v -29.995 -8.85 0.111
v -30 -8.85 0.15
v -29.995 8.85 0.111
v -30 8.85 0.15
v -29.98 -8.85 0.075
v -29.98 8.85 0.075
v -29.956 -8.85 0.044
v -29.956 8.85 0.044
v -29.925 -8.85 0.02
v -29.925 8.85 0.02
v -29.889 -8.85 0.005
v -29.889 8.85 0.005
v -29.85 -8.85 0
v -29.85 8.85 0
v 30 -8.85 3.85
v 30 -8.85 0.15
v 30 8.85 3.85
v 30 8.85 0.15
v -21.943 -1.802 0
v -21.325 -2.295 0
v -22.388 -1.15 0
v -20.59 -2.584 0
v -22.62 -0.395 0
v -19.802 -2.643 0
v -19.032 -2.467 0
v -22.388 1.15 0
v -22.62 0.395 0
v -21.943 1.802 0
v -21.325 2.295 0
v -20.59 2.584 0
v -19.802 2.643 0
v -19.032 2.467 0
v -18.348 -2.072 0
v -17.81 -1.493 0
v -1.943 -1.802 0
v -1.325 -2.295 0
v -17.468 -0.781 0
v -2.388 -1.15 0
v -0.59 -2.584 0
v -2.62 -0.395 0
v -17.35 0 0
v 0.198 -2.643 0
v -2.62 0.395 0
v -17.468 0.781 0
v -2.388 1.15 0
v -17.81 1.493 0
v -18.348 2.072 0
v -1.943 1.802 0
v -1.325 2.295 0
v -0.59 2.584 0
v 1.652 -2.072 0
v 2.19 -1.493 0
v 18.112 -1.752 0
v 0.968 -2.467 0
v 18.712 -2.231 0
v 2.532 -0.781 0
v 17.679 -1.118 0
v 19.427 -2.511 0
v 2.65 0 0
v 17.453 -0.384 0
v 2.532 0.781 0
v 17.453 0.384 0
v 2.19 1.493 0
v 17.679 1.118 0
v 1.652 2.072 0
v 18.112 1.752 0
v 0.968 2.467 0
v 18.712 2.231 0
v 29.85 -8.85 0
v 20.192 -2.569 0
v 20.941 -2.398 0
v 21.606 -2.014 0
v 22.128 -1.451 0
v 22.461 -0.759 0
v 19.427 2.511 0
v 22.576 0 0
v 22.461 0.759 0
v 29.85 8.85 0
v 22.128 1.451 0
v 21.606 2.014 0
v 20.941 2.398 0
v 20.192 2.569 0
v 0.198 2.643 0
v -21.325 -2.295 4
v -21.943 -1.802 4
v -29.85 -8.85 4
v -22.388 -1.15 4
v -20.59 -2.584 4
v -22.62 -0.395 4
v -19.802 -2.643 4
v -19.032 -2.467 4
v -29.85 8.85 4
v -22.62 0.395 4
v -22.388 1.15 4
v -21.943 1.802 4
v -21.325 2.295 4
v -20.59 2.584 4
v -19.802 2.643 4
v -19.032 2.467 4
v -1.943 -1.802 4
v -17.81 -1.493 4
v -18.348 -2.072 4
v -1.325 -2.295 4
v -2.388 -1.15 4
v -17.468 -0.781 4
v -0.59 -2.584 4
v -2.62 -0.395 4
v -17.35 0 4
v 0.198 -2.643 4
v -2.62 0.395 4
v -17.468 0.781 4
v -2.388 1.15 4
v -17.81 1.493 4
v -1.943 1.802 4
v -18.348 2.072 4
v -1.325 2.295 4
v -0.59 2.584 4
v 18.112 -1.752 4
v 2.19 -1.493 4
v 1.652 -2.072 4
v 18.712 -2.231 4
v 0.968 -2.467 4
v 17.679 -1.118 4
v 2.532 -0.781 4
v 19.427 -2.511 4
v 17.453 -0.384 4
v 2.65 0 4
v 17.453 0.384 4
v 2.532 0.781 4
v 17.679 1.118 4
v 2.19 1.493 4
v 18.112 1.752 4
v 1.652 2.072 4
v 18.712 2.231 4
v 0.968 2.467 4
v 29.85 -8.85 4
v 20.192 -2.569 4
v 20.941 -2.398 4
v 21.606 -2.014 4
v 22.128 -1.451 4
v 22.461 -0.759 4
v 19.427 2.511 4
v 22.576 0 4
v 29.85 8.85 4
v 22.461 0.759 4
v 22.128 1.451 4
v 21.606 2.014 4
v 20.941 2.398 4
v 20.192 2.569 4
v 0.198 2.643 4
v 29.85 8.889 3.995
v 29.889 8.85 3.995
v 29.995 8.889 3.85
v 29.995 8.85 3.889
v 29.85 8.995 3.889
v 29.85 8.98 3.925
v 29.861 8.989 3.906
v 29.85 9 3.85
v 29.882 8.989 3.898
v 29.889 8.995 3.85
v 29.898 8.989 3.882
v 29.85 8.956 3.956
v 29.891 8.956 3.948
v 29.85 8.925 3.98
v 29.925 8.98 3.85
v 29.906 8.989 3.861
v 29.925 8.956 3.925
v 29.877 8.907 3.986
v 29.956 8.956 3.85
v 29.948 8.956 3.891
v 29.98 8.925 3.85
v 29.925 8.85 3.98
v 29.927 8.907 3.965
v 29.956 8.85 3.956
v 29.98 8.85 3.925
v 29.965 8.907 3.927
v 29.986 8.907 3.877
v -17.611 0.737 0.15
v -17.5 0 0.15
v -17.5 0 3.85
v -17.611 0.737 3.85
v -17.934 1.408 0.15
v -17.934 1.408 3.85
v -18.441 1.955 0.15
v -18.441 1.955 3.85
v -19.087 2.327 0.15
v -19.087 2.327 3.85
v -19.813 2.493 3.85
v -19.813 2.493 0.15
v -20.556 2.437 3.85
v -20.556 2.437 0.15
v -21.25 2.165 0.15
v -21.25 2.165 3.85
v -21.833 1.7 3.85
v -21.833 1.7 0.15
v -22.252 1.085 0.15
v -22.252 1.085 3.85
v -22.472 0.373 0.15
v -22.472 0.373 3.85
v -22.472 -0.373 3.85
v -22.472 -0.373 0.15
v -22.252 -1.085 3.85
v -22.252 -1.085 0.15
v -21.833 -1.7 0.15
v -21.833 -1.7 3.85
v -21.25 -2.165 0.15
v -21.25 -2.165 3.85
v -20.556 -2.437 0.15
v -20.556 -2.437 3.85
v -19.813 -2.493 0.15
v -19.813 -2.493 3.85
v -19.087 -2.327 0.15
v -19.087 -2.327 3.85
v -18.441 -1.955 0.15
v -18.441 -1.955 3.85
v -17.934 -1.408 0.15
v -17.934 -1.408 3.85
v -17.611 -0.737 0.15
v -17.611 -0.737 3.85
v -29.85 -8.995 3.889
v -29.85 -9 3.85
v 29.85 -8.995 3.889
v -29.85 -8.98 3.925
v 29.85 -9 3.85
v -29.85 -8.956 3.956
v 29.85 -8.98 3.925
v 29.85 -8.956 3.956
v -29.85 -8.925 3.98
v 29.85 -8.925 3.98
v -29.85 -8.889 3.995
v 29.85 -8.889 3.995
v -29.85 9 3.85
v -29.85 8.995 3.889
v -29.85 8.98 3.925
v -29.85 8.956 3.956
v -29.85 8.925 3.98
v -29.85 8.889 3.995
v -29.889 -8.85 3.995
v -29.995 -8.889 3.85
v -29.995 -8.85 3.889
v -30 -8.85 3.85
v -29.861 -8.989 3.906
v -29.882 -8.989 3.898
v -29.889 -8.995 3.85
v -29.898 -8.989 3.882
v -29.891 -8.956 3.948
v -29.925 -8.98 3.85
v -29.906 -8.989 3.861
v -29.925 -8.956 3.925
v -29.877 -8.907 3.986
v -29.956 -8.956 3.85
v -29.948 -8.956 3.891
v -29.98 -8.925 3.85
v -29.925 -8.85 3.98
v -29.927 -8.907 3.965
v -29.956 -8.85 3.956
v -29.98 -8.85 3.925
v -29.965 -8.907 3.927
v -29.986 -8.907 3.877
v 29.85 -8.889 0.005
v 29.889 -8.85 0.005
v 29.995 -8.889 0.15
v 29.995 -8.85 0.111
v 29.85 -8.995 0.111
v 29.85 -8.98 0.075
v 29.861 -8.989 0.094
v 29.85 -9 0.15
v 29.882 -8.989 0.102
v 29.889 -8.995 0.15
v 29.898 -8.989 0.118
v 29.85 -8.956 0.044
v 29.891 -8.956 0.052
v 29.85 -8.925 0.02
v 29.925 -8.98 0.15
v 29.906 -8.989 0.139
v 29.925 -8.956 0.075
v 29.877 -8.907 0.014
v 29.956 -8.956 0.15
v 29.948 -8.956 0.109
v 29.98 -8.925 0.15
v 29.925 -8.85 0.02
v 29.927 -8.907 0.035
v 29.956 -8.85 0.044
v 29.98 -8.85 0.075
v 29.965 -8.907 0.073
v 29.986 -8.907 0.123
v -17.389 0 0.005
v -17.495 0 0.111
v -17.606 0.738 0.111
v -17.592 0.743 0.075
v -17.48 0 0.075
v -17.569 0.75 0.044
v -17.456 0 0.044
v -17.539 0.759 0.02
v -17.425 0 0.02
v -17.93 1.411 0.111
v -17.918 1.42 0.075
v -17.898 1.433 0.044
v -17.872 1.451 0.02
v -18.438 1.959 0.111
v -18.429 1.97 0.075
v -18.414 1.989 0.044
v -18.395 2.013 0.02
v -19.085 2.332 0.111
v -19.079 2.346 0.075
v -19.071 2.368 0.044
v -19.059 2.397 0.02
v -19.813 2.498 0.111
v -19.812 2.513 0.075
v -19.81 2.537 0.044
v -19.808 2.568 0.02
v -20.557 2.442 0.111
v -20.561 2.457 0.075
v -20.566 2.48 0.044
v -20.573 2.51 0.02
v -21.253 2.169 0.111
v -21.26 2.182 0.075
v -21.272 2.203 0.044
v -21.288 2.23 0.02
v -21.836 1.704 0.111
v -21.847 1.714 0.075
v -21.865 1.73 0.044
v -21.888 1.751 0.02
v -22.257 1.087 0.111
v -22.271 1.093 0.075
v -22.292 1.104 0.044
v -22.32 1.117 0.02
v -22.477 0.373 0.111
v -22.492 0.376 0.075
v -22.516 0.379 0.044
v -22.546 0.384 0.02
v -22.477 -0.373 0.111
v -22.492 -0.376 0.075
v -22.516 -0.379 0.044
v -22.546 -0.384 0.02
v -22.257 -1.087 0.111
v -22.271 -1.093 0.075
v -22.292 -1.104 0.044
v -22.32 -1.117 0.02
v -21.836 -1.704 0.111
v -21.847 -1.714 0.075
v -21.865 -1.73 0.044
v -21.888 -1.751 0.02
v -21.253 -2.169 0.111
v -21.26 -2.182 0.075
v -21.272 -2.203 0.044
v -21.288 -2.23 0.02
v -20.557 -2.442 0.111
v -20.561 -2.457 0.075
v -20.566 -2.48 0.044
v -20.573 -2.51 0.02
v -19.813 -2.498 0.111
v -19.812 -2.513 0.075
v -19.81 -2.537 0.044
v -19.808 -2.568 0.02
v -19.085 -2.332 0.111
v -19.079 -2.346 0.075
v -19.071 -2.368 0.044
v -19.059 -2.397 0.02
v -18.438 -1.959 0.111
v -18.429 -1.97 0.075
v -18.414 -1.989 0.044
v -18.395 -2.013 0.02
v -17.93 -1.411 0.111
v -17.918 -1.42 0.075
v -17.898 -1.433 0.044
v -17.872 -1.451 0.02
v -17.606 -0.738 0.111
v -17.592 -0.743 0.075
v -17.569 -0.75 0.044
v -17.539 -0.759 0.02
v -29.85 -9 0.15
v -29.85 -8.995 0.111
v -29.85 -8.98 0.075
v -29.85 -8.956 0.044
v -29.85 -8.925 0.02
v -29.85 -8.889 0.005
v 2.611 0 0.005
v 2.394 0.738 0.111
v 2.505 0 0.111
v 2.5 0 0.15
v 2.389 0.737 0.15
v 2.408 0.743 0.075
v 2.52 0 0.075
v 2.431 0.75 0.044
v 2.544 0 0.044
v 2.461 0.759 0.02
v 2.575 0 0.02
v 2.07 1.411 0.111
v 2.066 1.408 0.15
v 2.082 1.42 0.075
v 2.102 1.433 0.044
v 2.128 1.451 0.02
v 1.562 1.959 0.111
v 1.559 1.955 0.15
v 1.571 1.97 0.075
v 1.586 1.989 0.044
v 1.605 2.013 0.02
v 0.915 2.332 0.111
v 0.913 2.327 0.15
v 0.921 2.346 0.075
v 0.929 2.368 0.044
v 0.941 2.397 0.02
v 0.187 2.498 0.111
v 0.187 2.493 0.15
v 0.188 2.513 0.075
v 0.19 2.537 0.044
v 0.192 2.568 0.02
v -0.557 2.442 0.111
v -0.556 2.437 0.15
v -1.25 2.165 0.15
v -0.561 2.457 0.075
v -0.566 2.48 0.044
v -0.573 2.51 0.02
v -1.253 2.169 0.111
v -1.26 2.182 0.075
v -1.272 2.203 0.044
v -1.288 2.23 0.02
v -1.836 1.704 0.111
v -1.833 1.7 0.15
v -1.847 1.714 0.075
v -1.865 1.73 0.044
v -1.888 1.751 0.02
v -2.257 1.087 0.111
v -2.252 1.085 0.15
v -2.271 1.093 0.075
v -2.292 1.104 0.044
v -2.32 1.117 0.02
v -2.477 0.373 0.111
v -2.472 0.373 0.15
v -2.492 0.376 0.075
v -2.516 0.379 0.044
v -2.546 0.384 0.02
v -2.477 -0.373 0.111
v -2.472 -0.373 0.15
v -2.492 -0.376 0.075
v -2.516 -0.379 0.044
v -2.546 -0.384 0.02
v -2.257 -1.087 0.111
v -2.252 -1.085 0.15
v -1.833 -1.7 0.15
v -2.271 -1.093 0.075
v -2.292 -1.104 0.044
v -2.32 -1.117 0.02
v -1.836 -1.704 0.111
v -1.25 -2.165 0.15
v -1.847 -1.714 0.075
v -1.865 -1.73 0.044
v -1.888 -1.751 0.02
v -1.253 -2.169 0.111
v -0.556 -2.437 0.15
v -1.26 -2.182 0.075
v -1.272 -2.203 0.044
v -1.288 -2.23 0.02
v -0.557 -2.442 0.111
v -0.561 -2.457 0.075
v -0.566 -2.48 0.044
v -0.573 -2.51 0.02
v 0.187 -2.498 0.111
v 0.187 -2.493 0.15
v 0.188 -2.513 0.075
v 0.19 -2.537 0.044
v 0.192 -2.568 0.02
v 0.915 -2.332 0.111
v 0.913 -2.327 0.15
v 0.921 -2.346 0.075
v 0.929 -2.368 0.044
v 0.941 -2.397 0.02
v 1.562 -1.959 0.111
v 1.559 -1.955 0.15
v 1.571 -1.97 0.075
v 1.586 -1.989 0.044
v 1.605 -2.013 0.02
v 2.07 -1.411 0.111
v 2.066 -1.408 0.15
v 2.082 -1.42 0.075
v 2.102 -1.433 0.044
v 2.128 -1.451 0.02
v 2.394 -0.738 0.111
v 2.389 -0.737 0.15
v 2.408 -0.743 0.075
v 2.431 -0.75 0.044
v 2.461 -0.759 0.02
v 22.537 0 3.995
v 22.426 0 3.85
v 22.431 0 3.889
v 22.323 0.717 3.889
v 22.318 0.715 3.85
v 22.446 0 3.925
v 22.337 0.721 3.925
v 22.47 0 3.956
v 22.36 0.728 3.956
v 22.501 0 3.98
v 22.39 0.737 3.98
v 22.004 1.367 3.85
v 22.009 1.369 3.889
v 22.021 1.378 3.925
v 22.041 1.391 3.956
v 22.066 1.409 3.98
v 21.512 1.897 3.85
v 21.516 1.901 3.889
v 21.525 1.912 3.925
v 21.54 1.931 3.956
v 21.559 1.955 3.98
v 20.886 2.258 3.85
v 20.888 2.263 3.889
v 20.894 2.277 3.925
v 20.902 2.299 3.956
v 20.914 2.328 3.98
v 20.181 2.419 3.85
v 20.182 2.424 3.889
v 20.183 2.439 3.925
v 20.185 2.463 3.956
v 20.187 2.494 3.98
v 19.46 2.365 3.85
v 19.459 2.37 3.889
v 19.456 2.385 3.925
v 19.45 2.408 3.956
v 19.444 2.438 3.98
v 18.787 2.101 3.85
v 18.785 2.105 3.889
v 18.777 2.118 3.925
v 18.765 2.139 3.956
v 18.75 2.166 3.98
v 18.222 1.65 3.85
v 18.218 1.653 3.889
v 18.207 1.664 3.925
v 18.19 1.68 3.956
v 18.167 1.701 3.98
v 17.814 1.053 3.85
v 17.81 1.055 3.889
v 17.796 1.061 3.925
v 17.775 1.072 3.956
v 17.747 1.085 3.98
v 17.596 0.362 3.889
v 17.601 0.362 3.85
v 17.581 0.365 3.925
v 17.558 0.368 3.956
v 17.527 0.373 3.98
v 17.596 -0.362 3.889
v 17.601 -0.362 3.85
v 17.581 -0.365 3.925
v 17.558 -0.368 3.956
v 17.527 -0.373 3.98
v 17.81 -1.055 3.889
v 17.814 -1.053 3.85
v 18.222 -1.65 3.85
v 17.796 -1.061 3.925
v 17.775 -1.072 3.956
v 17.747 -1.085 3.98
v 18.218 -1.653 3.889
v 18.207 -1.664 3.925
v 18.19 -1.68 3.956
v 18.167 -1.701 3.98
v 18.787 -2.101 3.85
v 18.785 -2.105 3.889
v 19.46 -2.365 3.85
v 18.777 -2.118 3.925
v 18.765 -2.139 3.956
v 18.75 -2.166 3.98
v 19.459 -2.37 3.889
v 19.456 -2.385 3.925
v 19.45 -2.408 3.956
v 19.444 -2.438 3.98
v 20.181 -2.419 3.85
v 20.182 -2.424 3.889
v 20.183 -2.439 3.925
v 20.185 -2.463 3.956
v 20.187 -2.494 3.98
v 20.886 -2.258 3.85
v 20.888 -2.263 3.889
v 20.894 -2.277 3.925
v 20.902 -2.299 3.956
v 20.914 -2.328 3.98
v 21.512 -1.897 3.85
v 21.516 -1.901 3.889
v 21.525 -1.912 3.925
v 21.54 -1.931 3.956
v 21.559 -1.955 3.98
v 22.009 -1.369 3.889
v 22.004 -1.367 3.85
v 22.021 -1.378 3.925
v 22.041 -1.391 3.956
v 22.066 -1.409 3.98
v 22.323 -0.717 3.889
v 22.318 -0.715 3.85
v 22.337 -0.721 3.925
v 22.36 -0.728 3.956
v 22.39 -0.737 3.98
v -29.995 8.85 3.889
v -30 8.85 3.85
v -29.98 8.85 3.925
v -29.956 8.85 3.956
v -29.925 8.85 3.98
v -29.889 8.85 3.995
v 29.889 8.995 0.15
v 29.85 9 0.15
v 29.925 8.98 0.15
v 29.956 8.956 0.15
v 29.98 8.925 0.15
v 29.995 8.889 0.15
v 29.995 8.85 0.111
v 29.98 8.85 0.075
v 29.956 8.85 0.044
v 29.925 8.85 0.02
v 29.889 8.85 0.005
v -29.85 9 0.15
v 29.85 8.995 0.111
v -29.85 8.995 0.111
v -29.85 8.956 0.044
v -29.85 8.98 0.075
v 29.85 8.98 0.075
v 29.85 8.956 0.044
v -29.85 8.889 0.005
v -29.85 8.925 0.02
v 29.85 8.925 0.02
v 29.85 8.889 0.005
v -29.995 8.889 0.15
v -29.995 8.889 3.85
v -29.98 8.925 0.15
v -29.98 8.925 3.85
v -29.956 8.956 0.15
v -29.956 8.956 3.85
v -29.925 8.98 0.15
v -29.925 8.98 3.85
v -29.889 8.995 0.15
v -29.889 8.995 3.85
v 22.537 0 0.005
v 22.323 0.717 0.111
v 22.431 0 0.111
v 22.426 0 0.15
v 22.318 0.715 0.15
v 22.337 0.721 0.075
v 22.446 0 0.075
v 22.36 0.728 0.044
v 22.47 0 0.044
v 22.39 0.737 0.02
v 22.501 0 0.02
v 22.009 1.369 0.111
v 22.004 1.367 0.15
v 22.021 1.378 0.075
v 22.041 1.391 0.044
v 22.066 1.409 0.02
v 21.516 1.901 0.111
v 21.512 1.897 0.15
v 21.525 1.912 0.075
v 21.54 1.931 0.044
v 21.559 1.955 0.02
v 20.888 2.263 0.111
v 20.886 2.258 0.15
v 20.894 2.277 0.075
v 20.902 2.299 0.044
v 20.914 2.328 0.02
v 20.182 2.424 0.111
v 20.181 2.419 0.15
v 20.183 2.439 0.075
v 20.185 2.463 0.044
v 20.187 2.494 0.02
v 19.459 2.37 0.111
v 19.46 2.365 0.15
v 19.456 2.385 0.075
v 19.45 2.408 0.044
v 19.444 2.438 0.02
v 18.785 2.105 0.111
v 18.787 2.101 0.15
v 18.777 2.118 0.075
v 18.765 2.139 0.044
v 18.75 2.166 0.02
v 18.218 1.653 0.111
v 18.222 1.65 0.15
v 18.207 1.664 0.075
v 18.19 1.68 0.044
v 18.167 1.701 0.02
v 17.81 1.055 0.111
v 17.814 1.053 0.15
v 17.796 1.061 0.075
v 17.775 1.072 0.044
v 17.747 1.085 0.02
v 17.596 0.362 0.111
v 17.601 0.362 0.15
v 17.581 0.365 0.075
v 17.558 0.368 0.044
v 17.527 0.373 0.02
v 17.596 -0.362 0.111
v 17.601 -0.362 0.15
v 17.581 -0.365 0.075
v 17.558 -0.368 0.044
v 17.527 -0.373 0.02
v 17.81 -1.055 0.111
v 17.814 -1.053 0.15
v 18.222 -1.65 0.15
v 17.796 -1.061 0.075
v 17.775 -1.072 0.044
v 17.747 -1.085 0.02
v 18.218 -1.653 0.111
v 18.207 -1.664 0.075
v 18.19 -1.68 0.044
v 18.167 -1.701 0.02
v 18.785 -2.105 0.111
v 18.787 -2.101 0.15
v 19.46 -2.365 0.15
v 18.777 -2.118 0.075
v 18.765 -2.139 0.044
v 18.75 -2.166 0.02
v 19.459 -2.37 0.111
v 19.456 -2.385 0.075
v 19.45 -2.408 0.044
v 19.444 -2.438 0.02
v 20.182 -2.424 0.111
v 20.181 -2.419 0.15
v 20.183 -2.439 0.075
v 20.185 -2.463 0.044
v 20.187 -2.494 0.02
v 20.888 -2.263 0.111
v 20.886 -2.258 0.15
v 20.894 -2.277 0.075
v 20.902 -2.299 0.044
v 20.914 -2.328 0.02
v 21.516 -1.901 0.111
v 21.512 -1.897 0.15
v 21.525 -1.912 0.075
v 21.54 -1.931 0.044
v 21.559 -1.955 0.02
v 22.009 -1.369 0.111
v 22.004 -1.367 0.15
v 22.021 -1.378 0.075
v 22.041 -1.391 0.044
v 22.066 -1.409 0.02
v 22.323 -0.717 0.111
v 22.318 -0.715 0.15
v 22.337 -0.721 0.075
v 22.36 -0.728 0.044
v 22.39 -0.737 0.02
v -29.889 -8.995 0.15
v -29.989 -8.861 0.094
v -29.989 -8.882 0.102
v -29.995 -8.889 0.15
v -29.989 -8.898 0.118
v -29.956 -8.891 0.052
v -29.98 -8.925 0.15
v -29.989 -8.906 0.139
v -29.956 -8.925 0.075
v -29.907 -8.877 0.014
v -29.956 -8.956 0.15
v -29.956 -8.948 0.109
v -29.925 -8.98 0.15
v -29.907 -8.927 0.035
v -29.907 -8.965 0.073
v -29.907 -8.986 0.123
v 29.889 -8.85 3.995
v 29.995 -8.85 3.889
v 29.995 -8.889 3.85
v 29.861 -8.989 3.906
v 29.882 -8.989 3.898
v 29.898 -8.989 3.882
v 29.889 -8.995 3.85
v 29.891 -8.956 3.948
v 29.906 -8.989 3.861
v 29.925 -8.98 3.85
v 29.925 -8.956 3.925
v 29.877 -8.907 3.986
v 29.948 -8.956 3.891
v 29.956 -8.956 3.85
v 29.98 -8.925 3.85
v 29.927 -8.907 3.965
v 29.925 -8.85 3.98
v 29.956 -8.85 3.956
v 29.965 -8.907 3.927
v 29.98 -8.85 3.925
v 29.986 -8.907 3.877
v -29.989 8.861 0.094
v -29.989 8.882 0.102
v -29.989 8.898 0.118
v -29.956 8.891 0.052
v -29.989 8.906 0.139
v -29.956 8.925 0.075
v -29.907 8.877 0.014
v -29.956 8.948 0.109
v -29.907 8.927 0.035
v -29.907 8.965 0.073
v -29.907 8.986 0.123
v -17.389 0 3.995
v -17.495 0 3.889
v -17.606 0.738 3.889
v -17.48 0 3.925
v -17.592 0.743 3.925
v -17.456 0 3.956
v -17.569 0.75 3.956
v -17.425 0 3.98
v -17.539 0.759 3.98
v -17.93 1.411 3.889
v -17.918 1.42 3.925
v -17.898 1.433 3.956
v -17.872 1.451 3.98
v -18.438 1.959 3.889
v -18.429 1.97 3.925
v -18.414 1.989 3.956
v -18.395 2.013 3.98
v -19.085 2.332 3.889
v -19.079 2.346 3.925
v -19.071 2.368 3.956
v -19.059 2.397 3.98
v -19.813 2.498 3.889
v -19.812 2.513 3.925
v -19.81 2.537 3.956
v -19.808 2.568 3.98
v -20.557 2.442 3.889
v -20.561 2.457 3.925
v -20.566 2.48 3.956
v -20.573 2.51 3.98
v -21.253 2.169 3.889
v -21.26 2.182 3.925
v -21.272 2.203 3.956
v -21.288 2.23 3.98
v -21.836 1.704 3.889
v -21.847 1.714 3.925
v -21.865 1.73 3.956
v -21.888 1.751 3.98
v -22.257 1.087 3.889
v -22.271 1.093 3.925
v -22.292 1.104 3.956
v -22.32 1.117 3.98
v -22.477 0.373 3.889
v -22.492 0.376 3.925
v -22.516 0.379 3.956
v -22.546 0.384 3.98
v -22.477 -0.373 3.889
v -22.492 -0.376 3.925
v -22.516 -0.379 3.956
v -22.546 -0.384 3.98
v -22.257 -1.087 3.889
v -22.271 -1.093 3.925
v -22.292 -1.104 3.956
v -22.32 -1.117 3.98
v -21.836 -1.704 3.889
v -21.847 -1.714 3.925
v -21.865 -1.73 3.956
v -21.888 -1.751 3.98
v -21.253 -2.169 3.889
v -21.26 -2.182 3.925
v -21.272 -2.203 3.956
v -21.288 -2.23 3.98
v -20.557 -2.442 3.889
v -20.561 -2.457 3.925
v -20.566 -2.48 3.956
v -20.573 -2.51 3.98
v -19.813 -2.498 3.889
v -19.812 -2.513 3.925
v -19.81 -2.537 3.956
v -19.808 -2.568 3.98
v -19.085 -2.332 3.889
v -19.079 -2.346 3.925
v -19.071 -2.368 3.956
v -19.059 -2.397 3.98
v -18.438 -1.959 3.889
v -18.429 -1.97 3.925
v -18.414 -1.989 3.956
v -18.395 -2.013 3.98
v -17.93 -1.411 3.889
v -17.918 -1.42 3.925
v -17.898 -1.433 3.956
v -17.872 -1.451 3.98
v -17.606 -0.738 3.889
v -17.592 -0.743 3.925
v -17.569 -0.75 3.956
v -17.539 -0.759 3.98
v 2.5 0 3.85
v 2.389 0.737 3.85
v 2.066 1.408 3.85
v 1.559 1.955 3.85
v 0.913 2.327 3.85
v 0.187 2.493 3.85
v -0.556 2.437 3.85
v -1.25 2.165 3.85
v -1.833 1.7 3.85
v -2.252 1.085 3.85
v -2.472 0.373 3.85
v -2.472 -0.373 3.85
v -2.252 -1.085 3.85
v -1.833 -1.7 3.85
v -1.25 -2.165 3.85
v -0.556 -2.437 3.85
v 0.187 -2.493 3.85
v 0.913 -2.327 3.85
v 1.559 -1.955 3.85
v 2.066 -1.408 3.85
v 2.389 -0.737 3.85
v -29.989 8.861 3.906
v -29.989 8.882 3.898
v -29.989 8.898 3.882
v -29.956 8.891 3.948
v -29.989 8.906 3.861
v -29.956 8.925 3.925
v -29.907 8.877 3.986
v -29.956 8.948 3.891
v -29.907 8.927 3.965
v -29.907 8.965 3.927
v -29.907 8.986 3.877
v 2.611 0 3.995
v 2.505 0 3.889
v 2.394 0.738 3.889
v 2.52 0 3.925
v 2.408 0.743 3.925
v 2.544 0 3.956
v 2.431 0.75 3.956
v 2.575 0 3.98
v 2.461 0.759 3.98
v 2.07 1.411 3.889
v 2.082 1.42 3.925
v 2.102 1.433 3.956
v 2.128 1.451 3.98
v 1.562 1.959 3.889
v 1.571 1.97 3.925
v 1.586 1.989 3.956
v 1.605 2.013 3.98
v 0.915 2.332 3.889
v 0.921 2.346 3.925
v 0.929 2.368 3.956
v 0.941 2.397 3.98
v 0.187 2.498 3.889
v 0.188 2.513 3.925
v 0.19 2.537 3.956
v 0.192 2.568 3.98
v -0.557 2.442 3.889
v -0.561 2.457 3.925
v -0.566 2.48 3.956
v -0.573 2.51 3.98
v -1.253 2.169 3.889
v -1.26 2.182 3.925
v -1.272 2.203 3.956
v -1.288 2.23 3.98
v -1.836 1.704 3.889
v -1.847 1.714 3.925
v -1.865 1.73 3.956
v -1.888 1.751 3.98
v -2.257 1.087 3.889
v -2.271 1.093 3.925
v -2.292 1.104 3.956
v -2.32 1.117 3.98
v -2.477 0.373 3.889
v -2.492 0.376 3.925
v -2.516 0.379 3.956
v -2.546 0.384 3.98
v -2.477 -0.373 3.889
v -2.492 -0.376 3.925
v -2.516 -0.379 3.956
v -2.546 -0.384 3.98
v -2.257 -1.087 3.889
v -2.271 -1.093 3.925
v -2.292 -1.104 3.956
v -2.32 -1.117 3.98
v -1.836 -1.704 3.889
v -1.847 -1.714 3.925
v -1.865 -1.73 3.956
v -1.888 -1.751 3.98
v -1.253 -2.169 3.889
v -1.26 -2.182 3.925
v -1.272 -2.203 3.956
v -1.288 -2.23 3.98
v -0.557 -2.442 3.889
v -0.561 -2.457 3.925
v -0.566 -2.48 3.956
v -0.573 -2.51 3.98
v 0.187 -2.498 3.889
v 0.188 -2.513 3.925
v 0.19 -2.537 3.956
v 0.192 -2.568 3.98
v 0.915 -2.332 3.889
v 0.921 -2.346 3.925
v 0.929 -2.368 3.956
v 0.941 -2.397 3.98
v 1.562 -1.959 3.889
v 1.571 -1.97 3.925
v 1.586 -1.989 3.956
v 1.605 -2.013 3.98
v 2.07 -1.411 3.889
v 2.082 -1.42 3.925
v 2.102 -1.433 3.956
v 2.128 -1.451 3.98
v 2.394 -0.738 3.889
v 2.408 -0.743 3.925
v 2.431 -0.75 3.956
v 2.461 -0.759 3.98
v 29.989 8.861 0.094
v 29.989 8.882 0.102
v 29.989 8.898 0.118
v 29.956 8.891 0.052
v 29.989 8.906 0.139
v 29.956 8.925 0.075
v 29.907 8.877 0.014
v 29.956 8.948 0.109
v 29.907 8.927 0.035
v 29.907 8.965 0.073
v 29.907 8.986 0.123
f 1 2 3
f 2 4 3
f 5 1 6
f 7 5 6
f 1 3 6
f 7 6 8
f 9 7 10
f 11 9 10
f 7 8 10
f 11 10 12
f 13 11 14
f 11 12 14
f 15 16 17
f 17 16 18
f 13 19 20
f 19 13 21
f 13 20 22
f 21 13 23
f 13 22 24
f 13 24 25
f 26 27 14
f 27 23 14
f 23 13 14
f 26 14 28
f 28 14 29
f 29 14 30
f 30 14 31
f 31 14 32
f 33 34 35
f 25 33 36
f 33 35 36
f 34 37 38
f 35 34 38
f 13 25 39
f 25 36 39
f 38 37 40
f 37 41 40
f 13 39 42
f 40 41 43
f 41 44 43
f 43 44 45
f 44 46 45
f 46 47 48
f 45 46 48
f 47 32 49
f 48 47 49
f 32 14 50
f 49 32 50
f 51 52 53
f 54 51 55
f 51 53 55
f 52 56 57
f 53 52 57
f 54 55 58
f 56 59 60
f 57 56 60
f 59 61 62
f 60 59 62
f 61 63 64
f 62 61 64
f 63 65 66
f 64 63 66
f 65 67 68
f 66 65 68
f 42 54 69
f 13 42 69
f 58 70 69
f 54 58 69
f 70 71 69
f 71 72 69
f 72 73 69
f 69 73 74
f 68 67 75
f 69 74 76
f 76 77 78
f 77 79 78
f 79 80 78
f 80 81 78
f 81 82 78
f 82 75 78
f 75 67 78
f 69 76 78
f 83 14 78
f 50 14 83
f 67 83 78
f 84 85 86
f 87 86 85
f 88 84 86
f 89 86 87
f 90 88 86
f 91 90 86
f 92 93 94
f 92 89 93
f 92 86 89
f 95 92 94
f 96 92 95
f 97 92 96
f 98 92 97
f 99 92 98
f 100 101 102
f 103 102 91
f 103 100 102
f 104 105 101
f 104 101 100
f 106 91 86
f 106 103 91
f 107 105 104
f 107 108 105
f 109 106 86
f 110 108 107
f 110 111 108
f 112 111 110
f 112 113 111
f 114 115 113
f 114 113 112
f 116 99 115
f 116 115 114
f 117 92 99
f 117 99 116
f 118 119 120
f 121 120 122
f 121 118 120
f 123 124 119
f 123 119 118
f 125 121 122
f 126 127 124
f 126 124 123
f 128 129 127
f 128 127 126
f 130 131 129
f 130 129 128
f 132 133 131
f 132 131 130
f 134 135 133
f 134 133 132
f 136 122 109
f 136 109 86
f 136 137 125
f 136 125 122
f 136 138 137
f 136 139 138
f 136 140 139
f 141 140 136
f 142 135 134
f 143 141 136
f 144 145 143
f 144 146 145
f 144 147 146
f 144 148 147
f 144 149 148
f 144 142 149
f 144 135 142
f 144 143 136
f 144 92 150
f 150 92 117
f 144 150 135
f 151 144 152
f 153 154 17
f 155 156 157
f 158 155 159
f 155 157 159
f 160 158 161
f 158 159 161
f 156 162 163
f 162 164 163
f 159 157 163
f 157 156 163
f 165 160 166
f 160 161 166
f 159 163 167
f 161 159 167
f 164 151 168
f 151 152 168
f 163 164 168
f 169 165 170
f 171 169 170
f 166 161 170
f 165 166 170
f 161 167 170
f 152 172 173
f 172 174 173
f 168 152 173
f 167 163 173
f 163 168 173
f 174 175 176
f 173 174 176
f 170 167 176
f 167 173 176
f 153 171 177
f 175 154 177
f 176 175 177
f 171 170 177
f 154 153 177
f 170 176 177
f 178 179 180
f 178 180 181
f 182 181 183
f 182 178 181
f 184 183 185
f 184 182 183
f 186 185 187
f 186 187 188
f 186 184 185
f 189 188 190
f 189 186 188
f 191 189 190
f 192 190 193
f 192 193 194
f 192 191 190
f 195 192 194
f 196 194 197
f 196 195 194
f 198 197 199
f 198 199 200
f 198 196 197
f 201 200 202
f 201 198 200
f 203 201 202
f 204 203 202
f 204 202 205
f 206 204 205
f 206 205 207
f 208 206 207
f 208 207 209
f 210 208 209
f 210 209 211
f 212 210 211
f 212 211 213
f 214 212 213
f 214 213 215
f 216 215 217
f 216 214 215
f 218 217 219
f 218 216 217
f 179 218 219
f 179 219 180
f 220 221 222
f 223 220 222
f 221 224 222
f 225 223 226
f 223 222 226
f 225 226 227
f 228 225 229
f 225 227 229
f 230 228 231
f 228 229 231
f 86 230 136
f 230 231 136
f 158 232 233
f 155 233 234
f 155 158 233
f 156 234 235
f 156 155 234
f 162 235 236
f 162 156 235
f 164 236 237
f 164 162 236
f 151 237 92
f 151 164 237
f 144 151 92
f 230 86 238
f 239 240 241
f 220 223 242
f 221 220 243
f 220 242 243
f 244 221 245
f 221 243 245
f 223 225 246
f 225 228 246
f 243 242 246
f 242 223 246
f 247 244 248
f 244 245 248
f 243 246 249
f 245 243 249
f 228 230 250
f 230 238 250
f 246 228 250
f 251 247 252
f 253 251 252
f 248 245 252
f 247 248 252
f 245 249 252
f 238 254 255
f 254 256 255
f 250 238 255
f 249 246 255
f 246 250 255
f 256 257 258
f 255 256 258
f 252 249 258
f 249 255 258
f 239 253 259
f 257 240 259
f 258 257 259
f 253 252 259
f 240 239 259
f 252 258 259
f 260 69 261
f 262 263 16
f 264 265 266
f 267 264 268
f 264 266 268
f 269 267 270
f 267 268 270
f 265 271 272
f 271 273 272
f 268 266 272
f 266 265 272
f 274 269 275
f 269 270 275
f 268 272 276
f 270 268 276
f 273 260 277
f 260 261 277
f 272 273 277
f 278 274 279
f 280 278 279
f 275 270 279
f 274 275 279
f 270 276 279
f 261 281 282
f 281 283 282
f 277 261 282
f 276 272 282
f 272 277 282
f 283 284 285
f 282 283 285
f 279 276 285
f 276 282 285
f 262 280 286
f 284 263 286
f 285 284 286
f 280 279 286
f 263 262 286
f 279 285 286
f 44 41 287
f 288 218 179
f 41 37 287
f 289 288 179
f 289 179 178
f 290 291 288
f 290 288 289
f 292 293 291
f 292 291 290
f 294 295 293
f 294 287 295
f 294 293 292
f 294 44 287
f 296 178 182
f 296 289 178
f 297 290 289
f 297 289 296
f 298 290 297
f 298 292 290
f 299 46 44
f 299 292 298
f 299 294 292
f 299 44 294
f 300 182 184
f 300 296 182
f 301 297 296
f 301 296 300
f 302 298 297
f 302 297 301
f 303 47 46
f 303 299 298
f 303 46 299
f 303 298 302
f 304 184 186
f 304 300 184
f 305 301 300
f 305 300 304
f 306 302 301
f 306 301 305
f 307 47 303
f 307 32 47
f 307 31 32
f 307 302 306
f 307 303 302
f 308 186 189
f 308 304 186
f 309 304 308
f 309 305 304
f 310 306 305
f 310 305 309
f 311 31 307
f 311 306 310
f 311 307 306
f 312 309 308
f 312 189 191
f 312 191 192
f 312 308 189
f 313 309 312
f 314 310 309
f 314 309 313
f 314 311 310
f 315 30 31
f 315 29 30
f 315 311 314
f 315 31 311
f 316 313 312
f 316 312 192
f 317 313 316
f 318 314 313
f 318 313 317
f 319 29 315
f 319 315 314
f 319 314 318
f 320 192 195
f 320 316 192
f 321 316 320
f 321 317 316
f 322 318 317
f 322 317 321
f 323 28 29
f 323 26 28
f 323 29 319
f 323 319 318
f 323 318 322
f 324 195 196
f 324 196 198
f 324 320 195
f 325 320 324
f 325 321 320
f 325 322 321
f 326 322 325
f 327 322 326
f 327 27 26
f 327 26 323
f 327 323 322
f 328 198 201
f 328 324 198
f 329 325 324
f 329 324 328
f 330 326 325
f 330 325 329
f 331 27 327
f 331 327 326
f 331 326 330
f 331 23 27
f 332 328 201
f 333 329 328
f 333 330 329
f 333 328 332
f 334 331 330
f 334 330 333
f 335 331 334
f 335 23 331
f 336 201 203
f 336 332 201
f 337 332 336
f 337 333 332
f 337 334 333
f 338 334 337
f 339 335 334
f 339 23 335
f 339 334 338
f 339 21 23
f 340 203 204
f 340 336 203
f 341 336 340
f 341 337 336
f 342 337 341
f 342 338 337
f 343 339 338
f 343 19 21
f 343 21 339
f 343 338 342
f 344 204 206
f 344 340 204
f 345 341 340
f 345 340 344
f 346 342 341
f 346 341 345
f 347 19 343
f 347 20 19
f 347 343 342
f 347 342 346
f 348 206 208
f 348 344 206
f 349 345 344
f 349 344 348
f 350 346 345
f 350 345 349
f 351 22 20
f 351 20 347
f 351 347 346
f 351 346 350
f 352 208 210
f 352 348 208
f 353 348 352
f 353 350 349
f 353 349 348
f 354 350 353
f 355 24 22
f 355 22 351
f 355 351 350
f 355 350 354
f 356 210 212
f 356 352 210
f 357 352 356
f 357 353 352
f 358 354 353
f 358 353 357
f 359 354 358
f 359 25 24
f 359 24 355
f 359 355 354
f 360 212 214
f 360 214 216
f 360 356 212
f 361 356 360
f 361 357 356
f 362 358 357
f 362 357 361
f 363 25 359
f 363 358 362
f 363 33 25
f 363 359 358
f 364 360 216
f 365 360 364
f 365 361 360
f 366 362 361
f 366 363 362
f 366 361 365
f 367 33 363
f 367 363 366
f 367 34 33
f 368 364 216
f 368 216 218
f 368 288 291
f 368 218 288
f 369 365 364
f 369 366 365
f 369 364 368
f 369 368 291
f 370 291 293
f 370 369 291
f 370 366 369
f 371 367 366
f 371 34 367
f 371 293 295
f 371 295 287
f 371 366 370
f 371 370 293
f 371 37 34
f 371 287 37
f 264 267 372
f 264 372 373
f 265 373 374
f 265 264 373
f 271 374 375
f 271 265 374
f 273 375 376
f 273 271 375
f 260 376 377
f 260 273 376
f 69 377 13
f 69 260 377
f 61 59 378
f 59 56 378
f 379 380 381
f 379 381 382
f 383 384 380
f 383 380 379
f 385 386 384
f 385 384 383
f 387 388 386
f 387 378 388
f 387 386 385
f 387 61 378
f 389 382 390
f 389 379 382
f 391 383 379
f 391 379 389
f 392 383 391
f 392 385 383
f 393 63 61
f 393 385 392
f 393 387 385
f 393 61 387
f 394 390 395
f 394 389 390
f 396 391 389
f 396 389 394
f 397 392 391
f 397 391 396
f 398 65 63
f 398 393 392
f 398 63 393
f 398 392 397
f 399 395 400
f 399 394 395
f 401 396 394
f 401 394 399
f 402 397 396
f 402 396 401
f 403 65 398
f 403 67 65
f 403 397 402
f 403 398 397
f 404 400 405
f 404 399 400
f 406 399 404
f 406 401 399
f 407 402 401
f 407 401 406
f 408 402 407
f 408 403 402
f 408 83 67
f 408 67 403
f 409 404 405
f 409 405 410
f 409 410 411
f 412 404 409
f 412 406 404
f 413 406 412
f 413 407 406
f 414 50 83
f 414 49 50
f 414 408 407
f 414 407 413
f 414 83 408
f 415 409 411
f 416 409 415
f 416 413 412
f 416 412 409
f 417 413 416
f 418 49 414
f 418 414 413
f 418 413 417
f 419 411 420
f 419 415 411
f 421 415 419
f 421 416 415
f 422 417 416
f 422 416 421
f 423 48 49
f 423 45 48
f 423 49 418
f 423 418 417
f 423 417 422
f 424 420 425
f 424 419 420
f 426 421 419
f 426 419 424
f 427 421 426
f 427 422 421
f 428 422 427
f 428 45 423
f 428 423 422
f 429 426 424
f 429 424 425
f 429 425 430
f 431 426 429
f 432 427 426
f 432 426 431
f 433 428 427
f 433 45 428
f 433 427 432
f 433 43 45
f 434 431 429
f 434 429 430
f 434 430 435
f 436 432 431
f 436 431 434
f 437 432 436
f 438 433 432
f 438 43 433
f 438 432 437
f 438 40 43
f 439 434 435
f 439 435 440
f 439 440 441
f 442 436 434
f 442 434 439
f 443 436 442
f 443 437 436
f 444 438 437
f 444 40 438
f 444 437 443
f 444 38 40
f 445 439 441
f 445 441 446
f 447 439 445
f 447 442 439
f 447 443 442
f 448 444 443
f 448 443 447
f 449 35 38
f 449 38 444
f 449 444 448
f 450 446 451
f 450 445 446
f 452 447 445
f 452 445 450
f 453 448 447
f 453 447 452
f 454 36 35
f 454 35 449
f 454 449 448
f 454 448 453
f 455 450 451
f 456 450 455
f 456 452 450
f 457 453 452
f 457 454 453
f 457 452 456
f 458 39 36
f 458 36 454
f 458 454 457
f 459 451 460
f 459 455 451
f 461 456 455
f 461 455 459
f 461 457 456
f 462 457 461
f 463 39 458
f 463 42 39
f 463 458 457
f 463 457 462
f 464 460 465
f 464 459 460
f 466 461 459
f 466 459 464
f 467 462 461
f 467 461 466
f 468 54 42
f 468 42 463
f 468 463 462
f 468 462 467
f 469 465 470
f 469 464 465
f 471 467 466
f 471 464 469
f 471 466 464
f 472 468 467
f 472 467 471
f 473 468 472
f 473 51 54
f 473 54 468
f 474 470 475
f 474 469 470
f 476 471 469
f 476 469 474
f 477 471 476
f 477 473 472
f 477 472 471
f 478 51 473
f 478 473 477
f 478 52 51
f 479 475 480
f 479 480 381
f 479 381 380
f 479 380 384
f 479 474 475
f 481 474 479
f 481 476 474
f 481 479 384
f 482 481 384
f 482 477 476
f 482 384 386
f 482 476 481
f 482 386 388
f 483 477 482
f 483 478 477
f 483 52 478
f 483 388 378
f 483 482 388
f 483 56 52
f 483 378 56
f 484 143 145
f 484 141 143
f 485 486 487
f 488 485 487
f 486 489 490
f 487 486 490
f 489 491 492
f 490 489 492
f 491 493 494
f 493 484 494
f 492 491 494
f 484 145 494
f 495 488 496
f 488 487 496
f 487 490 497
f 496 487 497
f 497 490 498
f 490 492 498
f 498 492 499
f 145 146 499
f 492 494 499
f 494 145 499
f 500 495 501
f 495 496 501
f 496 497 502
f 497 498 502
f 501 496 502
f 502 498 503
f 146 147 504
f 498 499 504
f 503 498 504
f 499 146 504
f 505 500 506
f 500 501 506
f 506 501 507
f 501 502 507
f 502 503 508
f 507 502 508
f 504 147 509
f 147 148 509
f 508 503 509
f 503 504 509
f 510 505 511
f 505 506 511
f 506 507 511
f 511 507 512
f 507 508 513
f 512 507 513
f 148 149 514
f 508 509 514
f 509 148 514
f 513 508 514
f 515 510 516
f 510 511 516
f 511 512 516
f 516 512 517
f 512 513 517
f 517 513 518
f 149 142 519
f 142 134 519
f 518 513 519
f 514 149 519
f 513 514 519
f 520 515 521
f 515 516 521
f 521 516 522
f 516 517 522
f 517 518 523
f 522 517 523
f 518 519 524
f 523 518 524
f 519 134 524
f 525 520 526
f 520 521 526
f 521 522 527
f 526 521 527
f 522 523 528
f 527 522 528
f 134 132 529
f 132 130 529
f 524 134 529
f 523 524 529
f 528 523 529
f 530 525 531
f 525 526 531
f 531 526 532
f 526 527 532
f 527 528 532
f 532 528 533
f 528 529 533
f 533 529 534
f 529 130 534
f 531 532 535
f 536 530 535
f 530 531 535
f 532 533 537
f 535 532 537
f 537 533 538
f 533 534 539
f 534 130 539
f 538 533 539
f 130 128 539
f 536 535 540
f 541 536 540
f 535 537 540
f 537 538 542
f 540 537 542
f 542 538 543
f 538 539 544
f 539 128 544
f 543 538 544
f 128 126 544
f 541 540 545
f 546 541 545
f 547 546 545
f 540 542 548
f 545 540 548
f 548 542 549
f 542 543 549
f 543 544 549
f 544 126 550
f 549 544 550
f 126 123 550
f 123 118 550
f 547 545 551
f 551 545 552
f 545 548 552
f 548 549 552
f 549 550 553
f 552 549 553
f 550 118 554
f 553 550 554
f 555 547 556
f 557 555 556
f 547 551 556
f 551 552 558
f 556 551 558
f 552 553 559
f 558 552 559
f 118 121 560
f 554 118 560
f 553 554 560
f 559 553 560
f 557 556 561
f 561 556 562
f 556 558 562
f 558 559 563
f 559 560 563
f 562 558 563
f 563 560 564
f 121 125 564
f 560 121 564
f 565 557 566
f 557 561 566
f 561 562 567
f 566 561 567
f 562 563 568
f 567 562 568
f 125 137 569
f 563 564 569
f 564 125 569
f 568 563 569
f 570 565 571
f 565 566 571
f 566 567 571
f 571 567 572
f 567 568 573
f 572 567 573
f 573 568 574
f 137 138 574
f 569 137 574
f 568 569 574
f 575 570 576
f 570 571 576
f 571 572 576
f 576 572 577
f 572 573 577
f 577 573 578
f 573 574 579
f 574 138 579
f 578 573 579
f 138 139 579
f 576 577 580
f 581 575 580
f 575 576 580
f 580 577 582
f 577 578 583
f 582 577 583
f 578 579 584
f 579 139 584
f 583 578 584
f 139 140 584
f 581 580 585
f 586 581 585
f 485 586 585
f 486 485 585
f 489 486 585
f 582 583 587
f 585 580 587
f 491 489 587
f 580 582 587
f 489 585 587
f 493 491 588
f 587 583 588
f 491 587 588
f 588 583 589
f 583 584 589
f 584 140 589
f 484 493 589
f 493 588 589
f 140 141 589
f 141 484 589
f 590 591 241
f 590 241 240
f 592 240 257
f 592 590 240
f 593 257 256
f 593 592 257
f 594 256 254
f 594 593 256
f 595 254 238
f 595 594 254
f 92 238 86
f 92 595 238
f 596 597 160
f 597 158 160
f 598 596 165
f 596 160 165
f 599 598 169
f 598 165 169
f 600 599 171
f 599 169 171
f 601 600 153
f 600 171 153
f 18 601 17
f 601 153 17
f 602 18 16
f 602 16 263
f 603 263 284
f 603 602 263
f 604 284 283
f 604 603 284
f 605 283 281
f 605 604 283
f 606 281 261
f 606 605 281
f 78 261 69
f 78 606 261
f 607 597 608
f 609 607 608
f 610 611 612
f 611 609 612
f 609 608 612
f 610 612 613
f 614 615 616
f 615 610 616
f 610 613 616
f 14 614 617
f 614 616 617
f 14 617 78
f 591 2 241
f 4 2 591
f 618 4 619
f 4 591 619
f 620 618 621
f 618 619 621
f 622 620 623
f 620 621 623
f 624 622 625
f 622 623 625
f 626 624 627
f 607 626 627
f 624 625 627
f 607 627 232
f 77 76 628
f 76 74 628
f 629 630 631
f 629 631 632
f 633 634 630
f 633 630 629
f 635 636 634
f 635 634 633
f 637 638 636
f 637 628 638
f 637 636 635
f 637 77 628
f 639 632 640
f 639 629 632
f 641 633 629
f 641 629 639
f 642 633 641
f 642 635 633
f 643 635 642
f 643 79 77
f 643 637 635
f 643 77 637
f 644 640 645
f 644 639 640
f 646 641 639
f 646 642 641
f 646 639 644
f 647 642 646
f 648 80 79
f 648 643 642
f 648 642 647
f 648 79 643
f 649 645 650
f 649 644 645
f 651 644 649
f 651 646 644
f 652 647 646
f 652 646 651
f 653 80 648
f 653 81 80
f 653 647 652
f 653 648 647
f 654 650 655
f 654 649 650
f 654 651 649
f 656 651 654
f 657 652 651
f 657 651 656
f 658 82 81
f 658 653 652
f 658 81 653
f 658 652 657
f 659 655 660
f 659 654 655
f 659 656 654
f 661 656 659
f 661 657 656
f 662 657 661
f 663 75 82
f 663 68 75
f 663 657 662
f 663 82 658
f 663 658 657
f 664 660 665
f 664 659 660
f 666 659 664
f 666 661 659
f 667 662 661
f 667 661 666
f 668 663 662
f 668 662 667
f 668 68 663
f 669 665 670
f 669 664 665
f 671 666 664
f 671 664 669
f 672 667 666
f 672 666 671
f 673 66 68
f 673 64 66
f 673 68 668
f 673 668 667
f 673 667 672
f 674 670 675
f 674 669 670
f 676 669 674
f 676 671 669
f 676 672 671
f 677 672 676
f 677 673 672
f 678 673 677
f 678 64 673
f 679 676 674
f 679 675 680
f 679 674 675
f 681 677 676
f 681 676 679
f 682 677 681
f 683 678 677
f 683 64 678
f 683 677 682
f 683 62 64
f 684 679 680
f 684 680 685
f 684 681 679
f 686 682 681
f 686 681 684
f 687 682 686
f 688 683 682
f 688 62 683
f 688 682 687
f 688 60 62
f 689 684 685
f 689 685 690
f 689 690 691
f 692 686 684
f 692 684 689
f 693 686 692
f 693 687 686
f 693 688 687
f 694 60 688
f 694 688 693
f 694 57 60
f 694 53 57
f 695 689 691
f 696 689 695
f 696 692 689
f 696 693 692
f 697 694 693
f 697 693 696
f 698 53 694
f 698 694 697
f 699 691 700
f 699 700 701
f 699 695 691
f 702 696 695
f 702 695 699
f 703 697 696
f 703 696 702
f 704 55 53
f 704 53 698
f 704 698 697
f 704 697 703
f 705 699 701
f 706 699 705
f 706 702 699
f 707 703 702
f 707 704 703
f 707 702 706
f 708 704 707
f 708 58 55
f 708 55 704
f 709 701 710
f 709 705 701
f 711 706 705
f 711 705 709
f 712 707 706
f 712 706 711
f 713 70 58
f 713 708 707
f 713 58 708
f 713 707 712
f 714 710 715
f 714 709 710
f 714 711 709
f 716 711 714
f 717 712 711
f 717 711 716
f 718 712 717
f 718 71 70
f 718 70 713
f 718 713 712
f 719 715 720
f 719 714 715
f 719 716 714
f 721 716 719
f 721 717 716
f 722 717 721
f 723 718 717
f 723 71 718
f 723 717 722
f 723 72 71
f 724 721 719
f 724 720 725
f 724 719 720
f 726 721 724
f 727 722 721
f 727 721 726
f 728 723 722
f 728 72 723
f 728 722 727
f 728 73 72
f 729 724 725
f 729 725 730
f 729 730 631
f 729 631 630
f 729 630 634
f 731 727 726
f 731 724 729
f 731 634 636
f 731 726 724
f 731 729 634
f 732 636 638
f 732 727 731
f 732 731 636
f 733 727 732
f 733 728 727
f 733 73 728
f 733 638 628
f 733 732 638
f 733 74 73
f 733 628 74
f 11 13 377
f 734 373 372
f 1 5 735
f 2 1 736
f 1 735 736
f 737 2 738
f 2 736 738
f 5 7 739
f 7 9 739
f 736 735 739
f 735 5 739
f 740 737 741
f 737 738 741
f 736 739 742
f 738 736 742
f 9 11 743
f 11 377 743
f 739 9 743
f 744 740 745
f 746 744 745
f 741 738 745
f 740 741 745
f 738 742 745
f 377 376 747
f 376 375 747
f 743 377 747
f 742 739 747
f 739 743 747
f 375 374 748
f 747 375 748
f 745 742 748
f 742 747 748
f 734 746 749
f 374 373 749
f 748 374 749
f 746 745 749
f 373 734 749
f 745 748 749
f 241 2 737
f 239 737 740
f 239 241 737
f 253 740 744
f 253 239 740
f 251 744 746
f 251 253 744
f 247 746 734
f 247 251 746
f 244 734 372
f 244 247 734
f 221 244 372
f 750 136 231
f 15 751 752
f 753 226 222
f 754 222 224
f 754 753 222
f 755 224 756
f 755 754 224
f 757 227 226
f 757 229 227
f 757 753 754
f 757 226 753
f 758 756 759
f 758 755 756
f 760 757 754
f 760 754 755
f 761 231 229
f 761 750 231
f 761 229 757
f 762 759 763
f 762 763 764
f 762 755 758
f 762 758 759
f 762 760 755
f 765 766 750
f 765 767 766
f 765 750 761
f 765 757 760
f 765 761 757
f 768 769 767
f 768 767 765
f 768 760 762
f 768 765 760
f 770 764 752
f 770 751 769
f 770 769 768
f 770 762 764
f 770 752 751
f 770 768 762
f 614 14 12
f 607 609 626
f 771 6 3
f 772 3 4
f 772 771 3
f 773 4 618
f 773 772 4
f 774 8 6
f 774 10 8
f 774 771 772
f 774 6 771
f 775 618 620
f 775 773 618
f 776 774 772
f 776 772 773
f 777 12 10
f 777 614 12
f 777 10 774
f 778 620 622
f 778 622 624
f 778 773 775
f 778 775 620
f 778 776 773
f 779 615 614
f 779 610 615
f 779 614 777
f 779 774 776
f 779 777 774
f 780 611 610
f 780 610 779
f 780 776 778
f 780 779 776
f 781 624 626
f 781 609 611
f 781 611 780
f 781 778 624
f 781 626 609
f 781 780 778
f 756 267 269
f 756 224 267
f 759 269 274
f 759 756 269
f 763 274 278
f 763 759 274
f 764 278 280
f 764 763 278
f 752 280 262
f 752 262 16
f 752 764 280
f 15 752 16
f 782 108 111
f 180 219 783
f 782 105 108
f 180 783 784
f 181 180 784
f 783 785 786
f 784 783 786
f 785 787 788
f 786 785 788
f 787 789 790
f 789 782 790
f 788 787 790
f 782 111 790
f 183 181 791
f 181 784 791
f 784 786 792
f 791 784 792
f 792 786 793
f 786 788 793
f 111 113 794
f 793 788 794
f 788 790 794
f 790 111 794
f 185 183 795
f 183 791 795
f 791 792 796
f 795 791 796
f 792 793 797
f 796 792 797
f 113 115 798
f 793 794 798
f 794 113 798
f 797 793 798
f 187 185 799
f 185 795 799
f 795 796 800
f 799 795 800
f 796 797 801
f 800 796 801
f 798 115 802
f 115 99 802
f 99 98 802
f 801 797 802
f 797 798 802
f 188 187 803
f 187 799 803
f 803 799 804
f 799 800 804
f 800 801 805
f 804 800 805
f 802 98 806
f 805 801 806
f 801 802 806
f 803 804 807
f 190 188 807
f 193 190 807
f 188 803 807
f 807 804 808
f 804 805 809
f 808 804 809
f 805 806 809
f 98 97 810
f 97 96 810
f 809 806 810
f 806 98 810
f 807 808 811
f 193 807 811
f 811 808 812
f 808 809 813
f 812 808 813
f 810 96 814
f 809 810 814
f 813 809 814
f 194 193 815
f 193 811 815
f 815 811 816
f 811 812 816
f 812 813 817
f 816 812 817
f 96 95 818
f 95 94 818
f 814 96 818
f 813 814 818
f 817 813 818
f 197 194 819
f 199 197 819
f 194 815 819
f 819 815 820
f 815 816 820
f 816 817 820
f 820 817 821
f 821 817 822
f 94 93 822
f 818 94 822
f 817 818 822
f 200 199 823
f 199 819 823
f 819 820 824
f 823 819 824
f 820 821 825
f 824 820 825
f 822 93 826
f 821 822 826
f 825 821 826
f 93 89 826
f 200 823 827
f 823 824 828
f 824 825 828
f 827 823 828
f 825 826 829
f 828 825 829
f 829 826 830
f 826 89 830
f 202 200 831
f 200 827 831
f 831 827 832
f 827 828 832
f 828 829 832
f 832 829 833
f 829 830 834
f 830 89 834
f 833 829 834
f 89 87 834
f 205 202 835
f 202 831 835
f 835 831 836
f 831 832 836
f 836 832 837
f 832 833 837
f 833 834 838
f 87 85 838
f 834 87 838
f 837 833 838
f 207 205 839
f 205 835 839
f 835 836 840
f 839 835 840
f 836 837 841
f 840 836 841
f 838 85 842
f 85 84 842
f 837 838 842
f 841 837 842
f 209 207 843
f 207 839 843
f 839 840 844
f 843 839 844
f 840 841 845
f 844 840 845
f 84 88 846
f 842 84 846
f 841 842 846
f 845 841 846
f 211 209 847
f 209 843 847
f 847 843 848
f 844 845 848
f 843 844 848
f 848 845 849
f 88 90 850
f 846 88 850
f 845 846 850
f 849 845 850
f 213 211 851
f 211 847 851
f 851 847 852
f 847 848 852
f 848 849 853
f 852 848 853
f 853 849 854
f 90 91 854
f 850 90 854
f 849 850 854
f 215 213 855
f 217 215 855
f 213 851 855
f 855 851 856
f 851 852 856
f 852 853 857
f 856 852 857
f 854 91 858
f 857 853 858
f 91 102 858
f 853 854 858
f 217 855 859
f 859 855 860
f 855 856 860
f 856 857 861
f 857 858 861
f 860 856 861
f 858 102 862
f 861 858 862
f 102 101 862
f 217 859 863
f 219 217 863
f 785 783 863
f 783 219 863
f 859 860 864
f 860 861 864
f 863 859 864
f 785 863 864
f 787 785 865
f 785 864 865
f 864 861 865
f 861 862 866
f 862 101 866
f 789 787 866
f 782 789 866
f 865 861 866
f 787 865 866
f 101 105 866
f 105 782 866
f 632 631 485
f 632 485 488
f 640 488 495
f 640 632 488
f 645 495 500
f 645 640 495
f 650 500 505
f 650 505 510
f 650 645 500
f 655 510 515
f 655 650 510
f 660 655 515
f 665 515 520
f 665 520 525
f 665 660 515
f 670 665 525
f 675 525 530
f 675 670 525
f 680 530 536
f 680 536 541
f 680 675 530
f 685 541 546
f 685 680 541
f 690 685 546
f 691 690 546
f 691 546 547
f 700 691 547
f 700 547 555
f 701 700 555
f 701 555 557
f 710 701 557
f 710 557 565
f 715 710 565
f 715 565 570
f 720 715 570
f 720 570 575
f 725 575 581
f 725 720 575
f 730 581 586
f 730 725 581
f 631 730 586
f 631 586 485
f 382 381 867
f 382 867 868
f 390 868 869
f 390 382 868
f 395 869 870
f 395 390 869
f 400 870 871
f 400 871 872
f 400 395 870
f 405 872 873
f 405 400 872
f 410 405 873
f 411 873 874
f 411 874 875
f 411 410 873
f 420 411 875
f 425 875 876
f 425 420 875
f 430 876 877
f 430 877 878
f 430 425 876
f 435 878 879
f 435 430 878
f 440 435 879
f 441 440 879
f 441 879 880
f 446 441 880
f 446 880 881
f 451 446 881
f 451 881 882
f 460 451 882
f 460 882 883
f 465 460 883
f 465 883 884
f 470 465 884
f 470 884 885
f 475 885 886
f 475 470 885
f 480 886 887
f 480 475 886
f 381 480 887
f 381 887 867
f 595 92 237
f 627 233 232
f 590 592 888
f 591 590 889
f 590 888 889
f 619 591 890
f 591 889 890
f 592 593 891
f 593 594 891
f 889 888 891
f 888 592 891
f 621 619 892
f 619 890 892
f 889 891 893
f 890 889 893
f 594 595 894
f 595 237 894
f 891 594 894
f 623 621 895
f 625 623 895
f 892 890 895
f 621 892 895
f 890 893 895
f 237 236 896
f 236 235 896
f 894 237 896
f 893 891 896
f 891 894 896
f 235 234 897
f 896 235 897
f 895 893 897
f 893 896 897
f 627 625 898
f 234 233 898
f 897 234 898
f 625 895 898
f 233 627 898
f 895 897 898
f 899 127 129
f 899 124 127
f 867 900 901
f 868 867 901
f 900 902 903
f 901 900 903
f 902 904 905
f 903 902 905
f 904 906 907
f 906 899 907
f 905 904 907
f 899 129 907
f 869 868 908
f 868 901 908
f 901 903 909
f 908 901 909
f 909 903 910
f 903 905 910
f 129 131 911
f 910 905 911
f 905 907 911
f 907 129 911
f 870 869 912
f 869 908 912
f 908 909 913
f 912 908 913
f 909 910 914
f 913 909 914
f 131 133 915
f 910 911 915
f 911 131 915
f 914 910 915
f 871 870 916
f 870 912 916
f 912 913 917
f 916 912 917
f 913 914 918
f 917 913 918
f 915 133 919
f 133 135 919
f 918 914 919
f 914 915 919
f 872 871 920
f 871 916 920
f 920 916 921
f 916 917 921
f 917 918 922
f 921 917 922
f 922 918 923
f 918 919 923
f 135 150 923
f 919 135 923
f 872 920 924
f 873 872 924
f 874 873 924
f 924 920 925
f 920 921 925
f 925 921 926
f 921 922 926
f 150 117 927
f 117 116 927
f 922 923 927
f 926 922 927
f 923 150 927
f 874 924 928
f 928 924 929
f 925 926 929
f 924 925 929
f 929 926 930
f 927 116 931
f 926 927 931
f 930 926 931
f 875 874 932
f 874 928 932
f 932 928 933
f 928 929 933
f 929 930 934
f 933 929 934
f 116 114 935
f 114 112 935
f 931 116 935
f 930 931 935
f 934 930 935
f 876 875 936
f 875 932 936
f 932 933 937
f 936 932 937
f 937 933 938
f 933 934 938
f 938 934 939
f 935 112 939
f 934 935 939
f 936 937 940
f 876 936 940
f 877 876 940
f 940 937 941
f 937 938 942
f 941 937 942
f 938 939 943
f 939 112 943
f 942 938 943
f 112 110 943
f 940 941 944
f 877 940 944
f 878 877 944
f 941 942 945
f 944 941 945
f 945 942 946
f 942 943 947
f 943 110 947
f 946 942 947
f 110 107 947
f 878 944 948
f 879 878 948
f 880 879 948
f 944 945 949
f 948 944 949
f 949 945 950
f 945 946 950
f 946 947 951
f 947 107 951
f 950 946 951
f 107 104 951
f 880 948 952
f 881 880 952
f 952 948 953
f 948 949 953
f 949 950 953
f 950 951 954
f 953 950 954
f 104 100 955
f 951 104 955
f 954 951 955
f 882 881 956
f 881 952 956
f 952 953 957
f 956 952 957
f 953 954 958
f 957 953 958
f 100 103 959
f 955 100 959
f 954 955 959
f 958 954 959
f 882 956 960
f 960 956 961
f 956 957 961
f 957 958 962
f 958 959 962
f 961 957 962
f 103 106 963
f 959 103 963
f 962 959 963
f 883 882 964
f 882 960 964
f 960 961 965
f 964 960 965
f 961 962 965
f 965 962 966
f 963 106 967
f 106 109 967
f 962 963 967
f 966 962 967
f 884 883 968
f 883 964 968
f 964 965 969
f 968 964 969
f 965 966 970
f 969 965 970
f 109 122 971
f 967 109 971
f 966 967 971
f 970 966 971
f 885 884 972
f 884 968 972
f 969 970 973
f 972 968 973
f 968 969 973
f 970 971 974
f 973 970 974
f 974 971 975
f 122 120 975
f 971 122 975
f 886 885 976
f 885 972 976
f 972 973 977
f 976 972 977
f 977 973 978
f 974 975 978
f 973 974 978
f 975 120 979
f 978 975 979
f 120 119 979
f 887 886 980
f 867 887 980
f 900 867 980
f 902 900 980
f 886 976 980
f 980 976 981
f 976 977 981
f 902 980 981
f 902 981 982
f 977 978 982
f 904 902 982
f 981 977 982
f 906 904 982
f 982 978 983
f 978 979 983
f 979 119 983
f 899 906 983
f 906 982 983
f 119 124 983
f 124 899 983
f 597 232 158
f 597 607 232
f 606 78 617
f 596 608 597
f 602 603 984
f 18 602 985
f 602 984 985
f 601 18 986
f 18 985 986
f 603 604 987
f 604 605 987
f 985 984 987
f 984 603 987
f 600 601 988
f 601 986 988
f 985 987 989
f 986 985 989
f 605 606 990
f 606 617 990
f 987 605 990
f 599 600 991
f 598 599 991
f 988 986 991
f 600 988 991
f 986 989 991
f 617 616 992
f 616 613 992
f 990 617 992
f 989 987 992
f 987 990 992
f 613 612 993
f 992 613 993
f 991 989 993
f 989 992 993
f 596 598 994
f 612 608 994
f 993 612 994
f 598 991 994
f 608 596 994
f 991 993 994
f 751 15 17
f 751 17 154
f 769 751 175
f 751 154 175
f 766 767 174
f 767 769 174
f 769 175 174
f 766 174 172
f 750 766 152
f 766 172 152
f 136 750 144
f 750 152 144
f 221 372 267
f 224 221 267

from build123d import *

# Parameters (mm, degrees)
SKETCH1_W           = 60
SKETCH1_H           = 18
SKETCH1_R           = 2.5
SKETCH1_R_2         = 2.425824168
BOSS_EXTRUDE1_DEPTH = 4
FILLET1_R           = 0.15


with BuildPart() as part:
    # Sketch1 → Boss-Extrude1 (new body)
    with BuildSketch(Plane.XY):
        Rectangle(SKETCH1_W, SKETCH1_H)
        Circle(SKETCH1_R, mode=Mode.SUBTRACT)
        with Locations((20, 0)):
            Circle(SKETCH1_R_2, mode=Mode.SUBTRACT)
        with Locations((-20, 0)):
            Circle(SKETCH1_R, mode=Mode.SUBTRACT)
    extrude(amount=BOSS_EXTRUDE1_DEPTH)

    # Fillet1
    fillet1_edges = [part.edges().sort_by_distance(p)[0] for p in [
        (30, 0, 4),
        (-2.5, 0, 0),
        (-2.5, 0, 4),
        (0, 9, 4),
        (-22.5, 0, 0),
        (-22.5, 0, 4),
        (17.574175832, 0, 0),
        (17.574175832, 0, 4),
        (-30, 0, 4),
        (0, 9, 0),
        (30, 0, 0),
        (0, -9, 0),
        (-30, 0, 0),
        (0, -9, 4),
        (-30, 9, 2),
        (30, 9, 2),
        (30, -9, 2),
        (-30, -9, 2),
    ]]
    fillet(fillet1_edges, radius=FILLET1_R)


solid = part.part
